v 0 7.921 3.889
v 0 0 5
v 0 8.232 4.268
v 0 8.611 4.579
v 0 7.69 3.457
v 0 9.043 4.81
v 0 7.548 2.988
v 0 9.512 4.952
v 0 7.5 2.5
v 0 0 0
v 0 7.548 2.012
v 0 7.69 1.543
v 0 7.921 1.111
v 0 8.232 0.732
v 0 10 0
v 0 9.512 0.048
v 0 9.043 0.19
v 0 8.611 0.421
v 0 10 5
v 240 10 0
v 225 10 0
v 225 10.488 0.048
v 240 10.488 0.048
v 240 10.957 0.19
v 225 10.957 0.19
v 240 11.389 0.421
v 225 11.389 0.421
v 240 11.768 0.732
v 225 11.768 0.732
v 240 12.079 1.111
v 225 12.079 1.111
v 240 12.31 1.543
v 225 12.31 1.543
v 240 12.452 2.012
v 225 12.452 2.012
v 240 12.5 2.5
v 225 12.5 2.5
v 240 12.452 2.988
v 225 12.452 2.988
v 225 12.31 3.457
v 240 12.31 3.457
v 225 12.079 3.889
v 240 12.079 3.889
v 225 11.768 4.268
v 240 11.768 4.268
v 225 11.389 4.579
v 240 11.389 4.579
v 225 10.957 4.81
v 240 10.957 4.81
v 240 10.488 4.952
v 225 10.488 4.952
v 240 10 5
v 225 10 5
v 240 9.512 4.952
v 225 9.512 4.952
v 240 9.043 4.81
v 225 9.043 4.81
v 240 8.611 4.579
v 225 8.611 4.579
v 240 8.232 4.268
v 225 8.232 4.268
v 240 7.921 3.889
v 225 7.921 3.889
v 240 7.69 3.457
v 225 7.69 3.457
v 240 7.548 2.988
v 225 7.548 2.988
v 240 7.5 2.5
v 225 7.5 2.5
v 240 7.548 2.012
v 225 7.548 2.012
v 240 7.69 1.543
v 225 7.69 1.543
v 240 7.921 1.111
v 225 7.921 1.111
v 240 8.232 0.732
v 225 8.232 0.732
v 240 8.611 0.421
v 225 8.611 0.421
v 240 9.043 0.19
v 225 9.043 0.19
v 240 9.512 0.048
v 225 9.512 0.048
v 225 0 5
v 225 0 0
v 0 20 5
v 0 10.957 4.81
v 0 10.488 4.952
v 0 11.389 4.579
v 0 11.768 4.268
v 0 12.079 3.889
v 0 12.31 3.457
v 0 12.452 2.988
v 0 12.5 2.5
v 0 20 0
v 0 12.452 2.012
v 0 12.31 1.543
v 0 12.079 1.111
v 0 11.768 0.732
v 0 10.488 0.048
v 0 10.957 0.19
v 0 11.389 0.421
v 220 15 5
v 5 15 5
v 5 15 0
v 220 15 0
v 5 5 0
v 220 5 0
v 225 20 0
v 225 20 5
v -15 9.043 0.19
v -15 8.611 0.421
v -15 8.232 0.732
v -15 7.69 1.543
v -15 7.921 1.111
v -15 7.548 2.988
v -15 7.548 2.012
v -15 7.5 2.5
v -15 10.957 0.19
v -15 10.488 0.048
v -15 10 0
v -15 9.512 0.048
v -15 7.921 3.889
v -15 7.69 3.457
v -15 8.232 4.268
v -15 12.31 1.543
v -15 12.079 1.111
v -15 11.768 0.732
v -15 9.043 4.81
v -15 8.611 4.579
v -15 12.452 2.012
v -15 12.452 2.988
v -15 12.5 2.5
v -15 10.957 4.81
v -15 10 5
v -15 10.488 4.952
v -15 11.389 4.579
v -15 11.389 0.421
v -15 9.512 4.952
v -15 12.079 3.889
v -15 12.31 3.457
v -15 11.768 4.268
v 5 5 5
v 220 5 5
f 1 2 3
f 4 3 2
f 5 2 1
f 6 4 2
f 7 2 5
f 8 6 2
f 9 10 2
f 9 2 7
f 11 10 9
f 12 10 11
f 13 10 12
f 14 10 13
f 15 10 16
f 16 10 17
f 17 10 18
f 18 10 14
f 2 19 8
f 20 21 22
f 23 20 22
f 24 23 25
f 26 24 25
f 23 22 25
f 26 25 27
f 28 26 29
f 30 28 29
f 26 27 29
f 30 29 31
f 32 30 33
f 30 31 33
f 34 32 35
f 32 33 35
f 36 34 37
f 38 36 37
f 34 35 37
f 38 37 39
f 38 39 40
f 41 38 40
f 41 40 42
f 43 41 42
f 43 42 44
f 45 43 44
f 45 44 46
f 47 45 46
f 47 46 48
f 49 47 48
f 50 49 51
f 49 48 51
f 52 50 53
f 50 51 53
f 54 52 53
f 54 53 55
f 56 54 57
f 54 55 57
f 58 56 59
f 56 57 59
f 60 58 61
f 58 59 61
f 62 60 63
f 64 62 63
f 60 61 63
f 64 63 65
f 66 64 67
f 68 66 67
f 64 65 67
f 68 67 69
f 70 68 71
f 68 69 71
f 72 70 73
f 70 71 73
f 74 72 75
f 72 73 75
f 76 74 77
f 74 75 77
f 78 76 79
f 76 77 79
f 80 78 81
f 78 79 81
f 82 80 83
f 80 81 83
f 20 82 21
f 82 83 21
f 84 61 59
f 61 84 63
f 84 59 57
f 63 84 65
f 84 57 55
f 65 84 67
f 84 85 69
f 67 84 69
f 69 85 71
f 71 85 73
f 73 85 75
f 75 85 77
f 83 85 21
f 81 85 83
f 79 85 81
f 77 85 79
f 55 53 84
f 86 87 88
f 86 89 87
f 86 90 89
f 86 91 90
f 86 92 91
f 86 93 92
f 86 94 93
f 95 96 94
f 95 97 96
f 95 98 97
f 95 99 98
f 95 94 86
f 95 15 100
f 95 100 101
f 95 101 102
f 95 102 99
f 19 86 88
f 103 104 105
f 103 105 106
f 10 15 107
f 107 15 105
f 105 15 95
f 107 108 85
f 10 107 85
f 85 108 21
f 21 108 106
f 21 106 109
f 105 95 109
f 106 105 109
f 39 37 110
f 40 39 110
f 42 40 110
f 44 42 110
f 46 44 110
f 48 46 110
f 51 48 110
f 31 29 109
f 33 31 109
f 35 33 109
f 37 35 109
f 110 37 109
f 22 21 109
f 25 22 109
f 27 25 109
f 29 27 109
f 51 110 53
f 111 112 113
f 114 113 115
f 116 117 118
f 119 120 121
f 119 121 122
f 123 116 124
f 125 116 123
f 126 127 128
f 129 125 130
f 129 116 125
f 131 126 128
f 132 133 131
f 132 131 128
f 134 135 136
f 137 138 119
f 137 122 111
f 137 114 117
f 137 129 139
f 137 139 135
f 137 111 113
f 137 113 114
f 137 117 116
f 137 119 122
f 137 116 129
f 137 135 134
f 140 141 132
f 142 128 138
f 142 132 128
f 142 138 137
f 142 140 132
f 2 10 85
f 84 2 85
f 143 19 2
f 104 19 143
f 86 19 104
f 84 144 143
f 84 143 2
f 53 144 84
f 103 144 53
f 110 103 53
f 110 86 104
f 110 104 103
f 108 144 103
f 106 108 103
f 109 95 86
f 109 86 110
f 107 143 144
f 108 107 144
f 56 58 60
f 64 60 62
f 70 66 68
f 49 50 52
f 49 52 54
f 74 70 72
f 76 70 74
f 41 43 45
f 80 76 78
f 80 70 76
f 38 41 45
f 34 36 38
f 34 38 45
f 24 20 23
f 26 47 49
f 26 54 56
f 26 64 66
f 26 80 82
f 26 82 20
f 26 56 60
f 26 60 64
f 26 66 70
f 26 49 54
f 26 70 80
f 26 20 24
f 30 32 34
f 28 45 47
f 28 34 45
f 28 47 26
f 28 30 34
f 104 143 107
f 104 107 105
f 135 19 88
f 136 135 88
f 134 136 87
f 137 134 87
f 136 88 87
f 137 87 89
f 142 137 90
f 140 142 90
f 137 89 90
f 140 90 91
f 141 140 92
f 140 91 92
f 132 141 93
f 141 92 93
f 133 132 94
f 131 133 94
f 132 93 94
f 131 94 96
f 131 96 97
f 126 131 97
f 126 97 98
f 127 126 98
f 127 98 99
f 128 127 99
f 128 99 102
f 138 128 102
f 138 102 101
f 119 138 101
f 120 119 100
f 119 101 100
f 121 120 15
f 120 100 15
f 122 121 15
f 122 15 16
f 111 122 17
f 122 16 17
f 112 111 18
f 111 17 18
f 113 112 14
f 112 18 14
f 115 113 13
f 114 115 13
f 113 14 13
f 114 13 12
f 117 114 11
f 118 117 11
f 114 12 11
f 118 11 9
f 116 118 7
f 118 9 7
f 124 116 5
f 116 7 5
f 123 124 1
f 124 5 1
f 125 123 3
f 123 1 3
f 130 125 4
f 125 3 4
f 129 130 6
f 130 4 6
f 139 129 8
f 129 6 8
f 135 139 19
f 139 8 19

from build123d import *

# Parameters (mm, degrees)
SKETCH1_W           = 225
SKETCH1_H           = 20
BOSS_EXTRUDE1_DEPTH = 5
SKETCH2_R           = 2.5
BOSS_EXTRUDE2_DEPTH = 15
SKETCH3_R           = 2.5
BOSS_EXTRUDE3_DEPTH = 15
SKETCH4_W           = 215
SKETCH4_H           = 10
CUT_EXTRUDE1_DEPTH  = 6


with BuildPart() as part:
    # Sketch1 → Boss-Extrude1 (new body)
    with BuildSketch(Plane.XY):
        with Locations((112.5, 10)):
            Rectangle(SKETCH1_W, SKETCH1_H)
    extrude(amount=BOSS_EXTRUDE1_DEPTH)

    # Sketch2 → Boss-Extrude2 (add)
    with BuildSketch(Plane(origin=(225, 0, 0), x_dir=(0, 0, -1), z_dir=(1, 0, 0))):
        with Locations((-2.5, 10)):
            Circle(SKETCH2_R)
    extrude(amount=BOSS_EXTRUDE2_DEPTH)

    # Sketch3 → Boss-Extrude3 (add)
    with BuildSketch(Plane.ZY):
        with Locations((2.5, 10)):
            Circle(SKETCH3_R)
    extrude(amount=BOSS_EXTRUDE3_DEPTH)

    # Sketch4 → Cut-Extrude1 (cut, through all)
    with BuildSketch(Plane.XY.offset(5)):
        with Locations((112.5, 10)):
            Rectangle(SKETCH4_W, SKETCH4_H)
    extrude(amount=-CUT_EXTRUDE1_DEPTH, mode=Mode.SUBTRACT)


solid = part.part
